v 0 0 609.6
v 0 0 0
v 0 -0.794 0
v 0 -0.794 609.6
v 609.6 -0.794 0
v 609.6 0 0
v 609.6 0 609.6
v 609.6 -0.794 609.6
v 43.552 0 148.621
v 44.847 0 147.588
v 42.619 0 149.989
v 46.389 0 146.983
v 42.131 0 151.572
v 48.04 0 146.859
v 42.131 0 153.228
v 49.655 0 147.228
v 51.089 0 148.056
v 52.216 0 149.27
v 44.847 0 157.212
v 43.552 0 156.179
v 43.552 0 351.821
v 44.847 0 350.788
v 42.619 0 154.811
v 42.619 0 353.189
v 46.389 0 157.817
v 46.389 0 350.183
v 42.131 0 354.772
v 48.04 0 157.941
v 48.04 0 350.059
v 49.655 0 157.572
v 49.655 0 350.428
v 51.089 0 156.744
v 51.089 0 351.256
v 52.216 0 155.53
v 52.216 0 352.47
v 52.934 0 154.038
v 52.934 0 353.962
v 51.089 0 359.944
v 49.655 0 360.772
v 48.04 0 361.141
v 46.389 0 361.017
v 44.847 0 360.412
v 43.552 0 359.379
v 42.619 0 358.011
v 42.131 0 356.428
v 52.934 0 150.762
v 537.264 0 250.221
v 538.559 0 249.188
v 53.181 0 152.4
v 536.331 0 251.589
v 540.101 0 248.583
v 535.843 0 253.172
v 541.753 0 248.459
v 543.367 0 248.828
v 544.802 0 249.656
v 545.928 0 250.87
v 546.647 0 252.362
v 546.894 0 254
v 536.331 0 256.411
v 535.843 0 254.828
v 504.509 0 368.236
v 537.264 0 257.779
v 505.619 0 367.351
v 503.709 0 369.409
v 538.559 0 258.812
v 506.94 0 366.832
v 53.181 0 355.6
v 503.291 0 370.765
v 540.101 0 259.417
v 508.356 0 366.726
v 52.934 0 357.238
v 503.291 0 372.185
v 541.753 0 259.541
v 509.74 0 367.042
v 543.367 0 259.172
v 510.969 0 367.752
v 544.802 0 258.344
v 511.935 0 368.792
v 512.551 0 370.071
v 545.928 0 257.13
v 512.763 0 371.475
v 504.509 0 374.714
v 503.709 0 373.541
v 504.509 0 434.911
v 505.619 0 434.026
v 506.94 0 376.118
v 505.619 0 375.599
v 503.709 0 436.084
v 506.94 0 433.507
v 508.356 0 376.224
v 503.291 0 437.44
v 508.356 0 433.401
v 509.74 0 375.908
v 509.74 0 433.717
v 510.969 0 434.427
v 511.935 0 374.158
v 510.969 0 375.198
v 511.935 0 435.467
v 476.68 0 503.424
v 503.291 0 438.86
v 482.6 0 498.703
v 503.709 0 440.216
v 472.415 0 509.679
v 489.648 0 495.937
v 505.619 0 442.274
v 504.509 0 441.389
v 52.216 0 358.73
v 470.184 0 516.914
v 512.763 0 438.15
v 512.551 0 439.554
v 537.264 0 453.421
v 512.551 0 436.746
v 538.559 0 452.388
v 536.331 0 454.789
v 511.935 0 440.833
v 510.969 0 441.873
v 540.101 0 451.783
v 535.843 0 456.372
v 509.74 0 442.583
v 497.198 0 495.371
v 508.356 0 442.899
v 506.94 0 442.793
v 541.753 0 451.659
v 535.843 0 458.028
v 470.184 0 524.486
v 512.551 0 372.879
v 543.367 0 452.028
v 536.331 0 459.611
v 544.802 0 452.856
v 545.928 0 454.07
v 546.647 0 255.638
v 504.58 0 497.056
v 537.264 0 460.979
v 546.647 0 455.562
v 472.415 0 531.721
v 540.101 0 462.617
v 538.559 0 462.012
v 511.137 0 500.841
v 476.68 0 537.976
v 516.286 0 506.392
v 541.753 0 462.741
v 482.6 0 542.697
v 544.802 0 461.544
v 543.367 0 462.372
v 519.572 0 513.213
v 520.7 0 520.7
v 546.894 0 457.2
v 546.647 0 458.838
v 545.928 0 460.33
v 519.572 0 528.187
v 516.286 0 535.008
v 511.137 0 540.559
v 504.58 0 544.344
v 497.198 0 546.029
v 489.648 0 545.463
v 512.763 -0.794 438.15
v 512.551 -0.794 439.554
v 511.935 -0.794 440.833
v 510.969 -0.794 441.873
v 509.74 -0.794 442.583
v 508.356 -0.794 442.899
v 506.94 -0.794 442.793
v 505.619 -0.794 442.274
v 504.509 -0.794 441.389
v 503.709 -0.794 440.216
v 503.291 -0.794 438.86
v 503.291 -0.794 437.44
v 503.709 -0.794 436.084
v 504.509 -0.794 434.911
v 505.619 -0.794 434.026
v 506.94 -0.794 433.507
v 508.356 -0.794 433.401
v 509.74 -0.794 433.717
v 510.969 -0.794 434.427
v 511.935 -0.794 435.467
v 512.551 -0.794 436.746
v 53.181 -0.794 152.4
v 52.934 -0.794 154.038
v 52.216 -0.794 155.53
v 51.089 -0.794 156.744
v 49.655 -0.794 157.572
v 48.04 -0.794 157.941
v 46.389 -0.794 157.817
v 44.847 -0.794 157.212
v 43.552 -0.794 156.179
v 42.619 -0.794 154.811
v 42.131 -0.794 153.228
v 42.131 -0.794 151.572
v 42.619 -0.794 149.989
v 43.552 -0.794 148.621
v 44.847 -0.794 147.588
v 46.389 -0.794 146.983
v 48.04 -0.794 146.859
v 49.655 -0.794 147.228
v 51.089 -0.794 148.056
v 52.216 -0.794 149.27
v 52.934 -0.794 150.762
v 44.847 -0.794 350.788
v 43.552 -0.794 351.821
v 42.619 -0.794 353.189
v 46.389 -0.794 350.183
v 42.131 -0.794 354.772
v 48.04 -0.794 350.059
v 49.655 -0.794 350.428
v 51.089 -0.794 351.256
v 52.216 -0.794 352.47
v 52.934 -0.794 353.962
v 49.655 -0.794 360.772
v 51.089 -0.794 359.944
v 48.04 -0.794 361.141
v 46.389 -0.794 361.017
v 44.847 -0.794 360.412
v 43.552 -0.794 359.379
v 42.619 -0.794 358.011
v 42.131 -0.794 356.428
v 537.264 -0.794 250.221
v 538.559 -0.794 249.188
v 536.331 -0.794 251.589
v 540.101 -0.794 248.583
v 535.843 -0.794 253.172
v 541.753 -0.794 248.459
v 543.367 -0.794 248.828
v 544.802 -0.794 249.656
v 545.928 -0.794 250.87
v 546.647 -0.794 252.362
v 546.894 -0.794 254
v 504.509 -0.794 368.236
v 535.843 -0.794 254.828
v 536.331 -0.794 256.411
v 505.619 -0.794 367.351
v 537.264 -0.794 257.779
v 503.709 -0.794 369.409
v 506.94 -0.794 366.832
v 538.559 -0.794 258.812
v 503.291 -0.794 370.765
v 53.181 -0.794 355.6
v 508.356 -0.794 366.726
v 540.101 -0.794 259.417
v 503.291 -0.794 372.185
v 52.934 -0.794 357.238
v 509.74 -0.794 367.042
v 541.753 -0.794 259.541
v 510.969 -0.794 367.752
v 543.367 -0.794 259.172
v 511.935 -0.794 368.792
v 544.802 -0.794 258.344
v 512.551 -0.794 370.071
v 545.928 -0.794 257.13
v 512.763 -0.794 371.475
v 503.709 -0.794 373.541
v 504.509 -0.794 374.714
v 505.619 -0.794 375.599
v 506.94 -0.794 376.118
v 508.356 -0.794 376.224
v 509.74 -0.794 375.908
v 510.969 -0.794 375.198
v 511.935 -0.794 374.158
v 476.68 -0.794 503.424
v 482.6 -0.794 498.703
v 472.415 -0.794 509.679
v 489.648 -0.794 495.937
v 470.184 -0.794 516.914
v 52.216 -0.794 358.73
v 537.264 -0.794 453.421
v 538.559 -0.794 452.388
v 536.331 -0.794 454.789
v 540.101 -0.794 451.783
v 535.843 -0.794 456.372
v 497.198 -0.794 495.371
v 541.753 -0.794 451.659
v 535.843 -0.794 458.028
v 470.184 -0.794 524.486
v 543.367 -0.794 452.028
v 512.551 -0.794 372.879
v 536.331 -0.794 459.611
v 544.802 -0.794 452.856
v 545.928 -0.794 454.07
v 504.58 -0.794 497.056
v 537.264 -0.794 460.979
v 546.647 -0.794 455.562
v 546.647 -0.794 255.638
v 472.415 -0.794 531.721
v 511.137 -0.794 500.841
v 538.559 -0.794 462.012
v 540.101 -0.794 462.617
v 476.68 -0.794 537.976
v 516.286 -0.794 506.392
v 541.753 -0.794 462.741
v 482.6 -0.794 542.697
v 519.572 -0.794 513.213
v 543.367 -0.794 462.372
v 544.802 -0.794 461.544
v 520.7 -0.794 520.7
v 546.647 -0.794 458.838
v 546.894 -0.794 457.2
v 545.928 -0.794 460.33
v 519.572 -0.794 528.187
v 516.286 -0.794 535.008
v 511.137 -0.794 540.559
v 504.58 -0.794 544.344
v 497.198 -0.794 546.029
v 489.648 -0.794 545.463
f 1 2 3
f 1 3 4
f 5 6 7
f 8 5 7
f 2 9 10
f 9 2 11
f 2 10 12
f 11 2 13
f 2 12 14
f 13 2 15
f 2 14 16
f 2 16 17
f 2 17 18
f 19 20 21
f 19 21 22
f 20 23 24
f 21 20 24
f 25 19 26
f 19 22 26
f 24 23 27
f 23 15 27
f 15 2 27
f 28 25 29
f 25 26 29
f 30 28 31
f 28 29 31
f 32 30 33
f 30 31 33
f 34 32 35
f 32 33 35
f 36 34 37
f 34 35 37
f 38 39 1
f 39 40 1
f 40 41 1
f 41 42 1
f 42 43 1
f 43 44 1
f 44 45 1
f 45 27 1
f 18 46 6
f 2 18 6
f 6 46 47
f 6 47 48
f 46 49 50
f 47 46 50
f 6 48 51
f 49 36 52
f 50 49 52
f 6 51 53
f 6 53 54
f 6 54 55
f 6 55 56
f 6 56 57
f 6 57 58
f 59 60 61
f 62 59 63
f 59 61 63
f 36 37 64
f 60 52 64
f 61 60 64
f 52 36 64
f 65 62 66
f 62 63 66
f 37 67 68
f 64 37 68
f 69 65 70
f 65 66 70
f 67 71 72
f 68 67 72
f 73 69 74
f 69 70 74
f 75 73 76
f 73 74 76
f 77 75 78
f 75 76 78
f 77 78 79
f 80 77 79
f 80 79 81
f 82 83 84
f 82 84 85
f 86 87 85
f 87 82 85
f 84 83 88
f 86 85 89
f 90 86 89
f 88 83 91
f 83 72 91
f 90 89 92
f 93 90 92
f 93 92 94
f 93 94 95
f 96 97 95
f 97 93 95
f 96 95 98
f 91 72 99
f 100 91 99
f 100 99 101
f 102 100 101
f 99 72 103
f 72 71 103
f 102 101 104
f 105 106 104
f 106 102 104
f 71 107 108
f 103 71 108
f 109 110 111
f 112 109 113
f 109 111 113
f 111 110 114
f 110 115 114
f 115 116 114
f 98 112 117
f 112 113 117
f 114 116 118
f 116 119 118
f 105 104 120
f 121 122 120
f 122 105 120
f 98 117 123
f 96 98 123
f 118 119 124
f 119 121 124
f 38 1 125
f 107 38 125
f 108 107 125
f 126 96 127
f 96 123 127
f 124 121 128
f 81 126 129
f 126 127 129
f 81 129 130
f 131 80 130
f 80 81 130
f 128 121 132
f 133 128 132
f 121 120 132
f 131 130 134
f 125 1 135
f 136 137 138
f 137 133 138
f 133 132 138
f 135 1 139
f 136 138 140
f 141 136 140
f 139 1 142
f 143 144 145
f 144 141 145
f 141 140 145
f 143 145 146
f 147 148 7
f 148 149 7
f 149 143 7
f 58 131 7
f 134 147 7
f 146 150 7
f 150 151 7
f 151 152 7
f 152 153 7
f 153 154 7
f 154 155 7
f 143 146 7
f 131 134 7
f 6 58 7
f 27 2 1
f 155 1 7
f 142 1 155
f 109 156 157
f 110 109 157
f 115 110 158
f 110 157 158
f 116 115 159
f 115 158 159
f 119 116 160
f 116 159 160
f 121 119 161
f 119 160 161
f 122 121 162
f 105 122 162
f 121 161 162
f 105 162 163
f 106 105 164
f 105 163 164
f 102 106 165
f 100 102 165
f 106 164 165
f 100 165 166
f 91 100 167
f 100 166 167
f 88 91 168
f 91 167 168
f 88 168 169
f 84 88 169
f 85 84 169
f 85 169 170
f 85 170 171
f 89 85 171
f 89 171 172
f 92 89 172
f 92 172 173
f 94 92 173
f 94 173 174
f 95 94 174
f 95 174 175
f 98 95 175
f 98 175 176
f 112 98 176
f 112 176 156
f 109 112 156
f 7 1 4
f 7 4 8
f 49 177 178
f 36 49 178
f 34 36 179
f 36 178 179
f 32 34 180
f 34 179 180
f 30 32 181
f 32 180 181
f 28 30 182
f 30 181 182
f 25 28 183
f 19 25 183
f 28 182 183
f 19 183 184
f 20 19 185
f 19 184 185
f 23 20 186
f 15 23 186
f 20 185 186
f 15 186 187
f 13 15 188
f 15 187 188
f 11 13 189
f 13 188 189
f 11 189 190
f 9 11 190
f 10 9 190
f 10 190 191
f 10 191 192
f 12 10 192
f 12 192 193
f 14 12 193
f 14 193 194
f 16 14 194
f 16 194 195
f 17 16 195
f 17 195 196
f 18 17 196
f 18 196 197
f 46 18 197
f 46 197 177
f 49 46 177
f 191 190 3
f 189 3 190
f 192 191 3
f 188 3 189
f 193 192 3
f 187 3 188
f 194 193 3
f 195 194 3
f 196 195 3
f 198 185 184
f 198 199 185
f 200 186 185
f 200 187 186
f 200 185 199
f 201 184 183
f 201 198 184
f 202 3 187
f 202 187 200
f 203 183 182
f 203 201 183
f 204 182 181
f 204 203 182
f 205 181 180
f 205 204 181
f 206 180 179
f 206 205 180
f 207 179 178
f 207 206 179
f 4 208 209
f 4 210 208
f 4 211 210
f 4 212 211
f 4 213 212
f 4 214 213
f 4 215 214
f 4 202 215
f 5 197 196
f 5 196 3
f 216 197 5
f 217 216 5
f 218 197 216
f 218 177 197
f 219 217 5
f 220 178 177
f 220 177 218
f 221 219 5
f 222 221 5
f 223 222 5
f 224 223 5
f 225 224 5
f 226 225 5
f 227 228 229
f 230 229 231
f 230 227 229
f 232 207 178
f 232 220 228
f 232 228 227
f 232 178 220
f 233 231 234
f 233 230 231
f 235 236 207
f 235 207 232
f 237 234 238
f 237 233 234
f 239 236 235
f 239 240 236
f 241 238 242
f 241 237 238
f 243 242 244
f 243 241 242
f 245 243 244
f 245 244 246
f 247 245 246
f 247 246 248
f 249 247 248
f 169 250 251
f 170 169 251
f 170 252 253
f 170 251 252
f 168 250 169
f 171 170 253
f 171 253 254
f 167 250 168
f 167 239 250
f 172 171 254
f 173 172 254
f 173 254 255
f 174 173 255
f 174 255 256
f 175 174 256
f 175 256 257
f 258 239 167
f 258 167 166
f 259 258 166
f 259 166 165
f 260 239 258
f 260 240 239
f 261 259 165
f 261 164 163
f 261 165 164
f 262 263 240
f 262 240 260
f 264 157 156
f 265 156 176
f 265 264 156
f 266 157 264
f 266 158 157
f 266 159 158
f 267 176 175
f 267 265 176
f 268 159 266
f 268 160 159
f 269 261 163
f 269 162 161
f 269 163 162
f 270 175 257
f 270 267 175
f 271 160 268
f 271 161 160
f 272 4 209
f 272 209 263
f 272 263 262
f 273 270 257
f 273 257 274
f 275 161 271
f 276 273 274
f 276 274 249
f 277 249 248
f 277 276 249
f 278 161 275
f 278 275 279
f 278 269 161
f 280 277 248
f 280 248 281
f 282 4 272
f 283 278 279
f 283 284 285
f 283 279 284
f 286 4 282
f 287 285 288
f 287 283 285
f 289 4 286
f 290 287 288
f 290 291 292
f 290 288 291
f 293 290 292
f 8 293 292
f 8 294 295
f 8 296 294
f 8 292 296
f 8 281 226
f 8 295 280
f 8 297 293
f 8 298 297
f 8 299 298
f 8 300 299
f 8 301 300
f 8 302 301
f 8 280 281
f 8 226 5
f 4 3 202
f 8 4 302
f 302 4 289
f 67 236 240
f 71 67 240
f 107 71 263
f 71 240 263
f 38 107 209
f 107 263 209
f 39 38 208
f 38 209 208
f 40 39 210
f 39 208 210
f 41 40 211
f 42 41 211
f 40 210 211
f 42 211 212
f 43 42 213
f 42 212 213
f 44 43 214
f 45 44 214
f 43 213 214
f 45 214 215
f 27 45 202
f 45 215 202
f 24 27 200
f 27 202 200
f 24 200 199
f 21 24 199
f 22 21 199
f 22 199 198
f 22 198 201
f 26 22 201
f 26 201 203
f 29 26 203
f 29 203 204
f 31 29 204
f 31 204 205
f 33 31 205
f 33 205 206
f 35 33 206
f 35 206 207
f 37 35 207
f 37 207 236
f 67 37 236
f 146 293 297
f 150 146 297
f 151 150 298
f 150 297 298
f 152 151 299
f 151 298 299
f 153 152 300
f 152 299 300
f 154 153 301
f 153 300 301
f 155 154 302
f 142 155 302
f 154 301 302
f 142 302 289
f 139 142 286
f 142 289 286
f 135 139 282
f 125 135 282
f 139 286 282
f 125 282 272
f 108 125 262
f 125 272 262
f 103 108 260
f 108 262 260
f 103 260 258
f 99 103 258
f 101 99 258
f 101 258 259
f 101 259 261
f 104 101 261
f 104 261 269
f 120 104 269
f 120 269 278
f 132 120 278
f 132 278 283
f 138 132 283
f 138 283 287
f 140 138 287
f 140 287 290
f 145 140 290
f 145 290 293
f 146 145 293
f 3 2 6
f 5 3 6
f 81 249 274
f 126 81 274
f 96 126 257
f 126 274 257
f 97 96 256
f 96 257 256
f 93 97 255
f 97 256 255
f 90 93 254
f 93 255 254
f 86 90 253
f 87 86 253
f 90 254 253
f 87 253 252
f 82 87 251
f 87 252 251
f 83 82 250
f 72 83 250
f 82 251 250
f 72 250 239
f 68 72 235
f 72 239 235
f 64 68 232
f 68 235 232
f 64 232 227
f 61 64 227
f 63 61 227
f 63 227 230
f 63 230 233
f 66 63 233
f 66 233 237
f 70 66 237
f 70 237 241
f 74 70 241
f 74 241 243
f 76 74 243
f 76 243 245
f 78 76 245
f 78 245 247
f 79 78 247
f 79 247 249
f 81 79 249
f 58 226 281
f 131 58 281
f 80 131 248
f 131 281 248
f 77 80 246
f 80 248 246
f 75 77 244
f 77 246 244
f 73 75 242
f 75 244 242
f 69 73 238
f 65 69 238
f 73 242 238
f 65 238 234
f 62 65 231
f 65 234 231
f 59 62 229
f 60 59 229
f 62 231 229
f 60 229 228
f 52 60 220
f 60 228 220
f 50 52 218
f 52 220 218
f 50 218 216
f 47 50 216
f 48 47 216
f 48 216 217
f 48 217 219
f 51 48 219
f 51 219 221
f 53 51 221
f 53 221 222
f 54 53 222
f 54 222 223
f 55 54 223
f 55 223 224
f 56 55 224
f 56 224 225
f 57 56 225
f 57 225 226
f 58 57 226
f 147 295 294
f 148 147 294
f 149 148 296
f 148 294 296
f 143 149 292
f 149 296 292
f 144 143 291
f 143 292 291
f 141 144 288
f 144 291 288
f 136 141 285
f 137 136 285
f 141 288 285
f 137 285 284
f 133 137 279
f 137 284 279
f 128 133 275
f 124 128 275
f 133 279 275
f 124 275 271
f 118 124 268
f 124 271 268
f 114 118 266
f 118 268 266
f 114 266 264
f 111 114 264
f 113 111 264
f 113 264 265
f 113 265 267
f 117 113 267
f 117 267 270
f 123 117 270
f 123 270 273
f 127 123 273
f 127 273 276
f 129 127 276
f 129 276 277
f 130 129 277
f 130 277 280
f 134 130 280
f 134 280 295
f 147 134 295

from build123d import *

# Parameters (mm, degrees)
F0_W     = 609.6
F0_H     = 609.6
F1_DEPTH = 0.79375
F2_R     = 5.55625
F3_DEPTH = 25.4
F4_R     = 25.4
F4_R_2   = 4.7625
F5_DEPTH = 25.4


# Not quite as in the source:
# - a feature names something its author has since deleted; it is built from what else it names


with BuildPart() as f1:
    # F0 (on Front) → F1 (new body)
    with BuildSketch(Plane.XZ):
        with Locations((304.8, 304.8)):
            Rectangle(F0_W, F0_H)
    extrude(amount=F1_DEPTH)

    # F2 (on face) → F3 (cut)
    with BuildSketch(Plane.XZ.offset(0.79375)):
        with Locations((47.625, 355.6)):
            Circle(F2_R)
        with Locations((47.625, 152.4)):
            Circle(F2_R)
        with Locations((541.3375, 254)):
            Circle(F2_R)
        with Locations((541.3375, 457.2)):
            Circle(F2_R)
    extrude(amount=-F3_DEPTH, mode=Mode.SUBTRACT)

    # F4 (on face) → F5 (cut)
    with BuildSketch(Plane.XZ.offset(0.79375)):
        with Locations((495.3, 520.7)):
            Circle(F4_R)
        with Locations((508, 438.15)):
            Circle(F4_R_2)
        with Locations((508, 371.475)):
            Circle(F4_R_2)
    extrude(amount=-F5_DEPTH, mode=Mode.SUBTRACT)


solid = f1.part
